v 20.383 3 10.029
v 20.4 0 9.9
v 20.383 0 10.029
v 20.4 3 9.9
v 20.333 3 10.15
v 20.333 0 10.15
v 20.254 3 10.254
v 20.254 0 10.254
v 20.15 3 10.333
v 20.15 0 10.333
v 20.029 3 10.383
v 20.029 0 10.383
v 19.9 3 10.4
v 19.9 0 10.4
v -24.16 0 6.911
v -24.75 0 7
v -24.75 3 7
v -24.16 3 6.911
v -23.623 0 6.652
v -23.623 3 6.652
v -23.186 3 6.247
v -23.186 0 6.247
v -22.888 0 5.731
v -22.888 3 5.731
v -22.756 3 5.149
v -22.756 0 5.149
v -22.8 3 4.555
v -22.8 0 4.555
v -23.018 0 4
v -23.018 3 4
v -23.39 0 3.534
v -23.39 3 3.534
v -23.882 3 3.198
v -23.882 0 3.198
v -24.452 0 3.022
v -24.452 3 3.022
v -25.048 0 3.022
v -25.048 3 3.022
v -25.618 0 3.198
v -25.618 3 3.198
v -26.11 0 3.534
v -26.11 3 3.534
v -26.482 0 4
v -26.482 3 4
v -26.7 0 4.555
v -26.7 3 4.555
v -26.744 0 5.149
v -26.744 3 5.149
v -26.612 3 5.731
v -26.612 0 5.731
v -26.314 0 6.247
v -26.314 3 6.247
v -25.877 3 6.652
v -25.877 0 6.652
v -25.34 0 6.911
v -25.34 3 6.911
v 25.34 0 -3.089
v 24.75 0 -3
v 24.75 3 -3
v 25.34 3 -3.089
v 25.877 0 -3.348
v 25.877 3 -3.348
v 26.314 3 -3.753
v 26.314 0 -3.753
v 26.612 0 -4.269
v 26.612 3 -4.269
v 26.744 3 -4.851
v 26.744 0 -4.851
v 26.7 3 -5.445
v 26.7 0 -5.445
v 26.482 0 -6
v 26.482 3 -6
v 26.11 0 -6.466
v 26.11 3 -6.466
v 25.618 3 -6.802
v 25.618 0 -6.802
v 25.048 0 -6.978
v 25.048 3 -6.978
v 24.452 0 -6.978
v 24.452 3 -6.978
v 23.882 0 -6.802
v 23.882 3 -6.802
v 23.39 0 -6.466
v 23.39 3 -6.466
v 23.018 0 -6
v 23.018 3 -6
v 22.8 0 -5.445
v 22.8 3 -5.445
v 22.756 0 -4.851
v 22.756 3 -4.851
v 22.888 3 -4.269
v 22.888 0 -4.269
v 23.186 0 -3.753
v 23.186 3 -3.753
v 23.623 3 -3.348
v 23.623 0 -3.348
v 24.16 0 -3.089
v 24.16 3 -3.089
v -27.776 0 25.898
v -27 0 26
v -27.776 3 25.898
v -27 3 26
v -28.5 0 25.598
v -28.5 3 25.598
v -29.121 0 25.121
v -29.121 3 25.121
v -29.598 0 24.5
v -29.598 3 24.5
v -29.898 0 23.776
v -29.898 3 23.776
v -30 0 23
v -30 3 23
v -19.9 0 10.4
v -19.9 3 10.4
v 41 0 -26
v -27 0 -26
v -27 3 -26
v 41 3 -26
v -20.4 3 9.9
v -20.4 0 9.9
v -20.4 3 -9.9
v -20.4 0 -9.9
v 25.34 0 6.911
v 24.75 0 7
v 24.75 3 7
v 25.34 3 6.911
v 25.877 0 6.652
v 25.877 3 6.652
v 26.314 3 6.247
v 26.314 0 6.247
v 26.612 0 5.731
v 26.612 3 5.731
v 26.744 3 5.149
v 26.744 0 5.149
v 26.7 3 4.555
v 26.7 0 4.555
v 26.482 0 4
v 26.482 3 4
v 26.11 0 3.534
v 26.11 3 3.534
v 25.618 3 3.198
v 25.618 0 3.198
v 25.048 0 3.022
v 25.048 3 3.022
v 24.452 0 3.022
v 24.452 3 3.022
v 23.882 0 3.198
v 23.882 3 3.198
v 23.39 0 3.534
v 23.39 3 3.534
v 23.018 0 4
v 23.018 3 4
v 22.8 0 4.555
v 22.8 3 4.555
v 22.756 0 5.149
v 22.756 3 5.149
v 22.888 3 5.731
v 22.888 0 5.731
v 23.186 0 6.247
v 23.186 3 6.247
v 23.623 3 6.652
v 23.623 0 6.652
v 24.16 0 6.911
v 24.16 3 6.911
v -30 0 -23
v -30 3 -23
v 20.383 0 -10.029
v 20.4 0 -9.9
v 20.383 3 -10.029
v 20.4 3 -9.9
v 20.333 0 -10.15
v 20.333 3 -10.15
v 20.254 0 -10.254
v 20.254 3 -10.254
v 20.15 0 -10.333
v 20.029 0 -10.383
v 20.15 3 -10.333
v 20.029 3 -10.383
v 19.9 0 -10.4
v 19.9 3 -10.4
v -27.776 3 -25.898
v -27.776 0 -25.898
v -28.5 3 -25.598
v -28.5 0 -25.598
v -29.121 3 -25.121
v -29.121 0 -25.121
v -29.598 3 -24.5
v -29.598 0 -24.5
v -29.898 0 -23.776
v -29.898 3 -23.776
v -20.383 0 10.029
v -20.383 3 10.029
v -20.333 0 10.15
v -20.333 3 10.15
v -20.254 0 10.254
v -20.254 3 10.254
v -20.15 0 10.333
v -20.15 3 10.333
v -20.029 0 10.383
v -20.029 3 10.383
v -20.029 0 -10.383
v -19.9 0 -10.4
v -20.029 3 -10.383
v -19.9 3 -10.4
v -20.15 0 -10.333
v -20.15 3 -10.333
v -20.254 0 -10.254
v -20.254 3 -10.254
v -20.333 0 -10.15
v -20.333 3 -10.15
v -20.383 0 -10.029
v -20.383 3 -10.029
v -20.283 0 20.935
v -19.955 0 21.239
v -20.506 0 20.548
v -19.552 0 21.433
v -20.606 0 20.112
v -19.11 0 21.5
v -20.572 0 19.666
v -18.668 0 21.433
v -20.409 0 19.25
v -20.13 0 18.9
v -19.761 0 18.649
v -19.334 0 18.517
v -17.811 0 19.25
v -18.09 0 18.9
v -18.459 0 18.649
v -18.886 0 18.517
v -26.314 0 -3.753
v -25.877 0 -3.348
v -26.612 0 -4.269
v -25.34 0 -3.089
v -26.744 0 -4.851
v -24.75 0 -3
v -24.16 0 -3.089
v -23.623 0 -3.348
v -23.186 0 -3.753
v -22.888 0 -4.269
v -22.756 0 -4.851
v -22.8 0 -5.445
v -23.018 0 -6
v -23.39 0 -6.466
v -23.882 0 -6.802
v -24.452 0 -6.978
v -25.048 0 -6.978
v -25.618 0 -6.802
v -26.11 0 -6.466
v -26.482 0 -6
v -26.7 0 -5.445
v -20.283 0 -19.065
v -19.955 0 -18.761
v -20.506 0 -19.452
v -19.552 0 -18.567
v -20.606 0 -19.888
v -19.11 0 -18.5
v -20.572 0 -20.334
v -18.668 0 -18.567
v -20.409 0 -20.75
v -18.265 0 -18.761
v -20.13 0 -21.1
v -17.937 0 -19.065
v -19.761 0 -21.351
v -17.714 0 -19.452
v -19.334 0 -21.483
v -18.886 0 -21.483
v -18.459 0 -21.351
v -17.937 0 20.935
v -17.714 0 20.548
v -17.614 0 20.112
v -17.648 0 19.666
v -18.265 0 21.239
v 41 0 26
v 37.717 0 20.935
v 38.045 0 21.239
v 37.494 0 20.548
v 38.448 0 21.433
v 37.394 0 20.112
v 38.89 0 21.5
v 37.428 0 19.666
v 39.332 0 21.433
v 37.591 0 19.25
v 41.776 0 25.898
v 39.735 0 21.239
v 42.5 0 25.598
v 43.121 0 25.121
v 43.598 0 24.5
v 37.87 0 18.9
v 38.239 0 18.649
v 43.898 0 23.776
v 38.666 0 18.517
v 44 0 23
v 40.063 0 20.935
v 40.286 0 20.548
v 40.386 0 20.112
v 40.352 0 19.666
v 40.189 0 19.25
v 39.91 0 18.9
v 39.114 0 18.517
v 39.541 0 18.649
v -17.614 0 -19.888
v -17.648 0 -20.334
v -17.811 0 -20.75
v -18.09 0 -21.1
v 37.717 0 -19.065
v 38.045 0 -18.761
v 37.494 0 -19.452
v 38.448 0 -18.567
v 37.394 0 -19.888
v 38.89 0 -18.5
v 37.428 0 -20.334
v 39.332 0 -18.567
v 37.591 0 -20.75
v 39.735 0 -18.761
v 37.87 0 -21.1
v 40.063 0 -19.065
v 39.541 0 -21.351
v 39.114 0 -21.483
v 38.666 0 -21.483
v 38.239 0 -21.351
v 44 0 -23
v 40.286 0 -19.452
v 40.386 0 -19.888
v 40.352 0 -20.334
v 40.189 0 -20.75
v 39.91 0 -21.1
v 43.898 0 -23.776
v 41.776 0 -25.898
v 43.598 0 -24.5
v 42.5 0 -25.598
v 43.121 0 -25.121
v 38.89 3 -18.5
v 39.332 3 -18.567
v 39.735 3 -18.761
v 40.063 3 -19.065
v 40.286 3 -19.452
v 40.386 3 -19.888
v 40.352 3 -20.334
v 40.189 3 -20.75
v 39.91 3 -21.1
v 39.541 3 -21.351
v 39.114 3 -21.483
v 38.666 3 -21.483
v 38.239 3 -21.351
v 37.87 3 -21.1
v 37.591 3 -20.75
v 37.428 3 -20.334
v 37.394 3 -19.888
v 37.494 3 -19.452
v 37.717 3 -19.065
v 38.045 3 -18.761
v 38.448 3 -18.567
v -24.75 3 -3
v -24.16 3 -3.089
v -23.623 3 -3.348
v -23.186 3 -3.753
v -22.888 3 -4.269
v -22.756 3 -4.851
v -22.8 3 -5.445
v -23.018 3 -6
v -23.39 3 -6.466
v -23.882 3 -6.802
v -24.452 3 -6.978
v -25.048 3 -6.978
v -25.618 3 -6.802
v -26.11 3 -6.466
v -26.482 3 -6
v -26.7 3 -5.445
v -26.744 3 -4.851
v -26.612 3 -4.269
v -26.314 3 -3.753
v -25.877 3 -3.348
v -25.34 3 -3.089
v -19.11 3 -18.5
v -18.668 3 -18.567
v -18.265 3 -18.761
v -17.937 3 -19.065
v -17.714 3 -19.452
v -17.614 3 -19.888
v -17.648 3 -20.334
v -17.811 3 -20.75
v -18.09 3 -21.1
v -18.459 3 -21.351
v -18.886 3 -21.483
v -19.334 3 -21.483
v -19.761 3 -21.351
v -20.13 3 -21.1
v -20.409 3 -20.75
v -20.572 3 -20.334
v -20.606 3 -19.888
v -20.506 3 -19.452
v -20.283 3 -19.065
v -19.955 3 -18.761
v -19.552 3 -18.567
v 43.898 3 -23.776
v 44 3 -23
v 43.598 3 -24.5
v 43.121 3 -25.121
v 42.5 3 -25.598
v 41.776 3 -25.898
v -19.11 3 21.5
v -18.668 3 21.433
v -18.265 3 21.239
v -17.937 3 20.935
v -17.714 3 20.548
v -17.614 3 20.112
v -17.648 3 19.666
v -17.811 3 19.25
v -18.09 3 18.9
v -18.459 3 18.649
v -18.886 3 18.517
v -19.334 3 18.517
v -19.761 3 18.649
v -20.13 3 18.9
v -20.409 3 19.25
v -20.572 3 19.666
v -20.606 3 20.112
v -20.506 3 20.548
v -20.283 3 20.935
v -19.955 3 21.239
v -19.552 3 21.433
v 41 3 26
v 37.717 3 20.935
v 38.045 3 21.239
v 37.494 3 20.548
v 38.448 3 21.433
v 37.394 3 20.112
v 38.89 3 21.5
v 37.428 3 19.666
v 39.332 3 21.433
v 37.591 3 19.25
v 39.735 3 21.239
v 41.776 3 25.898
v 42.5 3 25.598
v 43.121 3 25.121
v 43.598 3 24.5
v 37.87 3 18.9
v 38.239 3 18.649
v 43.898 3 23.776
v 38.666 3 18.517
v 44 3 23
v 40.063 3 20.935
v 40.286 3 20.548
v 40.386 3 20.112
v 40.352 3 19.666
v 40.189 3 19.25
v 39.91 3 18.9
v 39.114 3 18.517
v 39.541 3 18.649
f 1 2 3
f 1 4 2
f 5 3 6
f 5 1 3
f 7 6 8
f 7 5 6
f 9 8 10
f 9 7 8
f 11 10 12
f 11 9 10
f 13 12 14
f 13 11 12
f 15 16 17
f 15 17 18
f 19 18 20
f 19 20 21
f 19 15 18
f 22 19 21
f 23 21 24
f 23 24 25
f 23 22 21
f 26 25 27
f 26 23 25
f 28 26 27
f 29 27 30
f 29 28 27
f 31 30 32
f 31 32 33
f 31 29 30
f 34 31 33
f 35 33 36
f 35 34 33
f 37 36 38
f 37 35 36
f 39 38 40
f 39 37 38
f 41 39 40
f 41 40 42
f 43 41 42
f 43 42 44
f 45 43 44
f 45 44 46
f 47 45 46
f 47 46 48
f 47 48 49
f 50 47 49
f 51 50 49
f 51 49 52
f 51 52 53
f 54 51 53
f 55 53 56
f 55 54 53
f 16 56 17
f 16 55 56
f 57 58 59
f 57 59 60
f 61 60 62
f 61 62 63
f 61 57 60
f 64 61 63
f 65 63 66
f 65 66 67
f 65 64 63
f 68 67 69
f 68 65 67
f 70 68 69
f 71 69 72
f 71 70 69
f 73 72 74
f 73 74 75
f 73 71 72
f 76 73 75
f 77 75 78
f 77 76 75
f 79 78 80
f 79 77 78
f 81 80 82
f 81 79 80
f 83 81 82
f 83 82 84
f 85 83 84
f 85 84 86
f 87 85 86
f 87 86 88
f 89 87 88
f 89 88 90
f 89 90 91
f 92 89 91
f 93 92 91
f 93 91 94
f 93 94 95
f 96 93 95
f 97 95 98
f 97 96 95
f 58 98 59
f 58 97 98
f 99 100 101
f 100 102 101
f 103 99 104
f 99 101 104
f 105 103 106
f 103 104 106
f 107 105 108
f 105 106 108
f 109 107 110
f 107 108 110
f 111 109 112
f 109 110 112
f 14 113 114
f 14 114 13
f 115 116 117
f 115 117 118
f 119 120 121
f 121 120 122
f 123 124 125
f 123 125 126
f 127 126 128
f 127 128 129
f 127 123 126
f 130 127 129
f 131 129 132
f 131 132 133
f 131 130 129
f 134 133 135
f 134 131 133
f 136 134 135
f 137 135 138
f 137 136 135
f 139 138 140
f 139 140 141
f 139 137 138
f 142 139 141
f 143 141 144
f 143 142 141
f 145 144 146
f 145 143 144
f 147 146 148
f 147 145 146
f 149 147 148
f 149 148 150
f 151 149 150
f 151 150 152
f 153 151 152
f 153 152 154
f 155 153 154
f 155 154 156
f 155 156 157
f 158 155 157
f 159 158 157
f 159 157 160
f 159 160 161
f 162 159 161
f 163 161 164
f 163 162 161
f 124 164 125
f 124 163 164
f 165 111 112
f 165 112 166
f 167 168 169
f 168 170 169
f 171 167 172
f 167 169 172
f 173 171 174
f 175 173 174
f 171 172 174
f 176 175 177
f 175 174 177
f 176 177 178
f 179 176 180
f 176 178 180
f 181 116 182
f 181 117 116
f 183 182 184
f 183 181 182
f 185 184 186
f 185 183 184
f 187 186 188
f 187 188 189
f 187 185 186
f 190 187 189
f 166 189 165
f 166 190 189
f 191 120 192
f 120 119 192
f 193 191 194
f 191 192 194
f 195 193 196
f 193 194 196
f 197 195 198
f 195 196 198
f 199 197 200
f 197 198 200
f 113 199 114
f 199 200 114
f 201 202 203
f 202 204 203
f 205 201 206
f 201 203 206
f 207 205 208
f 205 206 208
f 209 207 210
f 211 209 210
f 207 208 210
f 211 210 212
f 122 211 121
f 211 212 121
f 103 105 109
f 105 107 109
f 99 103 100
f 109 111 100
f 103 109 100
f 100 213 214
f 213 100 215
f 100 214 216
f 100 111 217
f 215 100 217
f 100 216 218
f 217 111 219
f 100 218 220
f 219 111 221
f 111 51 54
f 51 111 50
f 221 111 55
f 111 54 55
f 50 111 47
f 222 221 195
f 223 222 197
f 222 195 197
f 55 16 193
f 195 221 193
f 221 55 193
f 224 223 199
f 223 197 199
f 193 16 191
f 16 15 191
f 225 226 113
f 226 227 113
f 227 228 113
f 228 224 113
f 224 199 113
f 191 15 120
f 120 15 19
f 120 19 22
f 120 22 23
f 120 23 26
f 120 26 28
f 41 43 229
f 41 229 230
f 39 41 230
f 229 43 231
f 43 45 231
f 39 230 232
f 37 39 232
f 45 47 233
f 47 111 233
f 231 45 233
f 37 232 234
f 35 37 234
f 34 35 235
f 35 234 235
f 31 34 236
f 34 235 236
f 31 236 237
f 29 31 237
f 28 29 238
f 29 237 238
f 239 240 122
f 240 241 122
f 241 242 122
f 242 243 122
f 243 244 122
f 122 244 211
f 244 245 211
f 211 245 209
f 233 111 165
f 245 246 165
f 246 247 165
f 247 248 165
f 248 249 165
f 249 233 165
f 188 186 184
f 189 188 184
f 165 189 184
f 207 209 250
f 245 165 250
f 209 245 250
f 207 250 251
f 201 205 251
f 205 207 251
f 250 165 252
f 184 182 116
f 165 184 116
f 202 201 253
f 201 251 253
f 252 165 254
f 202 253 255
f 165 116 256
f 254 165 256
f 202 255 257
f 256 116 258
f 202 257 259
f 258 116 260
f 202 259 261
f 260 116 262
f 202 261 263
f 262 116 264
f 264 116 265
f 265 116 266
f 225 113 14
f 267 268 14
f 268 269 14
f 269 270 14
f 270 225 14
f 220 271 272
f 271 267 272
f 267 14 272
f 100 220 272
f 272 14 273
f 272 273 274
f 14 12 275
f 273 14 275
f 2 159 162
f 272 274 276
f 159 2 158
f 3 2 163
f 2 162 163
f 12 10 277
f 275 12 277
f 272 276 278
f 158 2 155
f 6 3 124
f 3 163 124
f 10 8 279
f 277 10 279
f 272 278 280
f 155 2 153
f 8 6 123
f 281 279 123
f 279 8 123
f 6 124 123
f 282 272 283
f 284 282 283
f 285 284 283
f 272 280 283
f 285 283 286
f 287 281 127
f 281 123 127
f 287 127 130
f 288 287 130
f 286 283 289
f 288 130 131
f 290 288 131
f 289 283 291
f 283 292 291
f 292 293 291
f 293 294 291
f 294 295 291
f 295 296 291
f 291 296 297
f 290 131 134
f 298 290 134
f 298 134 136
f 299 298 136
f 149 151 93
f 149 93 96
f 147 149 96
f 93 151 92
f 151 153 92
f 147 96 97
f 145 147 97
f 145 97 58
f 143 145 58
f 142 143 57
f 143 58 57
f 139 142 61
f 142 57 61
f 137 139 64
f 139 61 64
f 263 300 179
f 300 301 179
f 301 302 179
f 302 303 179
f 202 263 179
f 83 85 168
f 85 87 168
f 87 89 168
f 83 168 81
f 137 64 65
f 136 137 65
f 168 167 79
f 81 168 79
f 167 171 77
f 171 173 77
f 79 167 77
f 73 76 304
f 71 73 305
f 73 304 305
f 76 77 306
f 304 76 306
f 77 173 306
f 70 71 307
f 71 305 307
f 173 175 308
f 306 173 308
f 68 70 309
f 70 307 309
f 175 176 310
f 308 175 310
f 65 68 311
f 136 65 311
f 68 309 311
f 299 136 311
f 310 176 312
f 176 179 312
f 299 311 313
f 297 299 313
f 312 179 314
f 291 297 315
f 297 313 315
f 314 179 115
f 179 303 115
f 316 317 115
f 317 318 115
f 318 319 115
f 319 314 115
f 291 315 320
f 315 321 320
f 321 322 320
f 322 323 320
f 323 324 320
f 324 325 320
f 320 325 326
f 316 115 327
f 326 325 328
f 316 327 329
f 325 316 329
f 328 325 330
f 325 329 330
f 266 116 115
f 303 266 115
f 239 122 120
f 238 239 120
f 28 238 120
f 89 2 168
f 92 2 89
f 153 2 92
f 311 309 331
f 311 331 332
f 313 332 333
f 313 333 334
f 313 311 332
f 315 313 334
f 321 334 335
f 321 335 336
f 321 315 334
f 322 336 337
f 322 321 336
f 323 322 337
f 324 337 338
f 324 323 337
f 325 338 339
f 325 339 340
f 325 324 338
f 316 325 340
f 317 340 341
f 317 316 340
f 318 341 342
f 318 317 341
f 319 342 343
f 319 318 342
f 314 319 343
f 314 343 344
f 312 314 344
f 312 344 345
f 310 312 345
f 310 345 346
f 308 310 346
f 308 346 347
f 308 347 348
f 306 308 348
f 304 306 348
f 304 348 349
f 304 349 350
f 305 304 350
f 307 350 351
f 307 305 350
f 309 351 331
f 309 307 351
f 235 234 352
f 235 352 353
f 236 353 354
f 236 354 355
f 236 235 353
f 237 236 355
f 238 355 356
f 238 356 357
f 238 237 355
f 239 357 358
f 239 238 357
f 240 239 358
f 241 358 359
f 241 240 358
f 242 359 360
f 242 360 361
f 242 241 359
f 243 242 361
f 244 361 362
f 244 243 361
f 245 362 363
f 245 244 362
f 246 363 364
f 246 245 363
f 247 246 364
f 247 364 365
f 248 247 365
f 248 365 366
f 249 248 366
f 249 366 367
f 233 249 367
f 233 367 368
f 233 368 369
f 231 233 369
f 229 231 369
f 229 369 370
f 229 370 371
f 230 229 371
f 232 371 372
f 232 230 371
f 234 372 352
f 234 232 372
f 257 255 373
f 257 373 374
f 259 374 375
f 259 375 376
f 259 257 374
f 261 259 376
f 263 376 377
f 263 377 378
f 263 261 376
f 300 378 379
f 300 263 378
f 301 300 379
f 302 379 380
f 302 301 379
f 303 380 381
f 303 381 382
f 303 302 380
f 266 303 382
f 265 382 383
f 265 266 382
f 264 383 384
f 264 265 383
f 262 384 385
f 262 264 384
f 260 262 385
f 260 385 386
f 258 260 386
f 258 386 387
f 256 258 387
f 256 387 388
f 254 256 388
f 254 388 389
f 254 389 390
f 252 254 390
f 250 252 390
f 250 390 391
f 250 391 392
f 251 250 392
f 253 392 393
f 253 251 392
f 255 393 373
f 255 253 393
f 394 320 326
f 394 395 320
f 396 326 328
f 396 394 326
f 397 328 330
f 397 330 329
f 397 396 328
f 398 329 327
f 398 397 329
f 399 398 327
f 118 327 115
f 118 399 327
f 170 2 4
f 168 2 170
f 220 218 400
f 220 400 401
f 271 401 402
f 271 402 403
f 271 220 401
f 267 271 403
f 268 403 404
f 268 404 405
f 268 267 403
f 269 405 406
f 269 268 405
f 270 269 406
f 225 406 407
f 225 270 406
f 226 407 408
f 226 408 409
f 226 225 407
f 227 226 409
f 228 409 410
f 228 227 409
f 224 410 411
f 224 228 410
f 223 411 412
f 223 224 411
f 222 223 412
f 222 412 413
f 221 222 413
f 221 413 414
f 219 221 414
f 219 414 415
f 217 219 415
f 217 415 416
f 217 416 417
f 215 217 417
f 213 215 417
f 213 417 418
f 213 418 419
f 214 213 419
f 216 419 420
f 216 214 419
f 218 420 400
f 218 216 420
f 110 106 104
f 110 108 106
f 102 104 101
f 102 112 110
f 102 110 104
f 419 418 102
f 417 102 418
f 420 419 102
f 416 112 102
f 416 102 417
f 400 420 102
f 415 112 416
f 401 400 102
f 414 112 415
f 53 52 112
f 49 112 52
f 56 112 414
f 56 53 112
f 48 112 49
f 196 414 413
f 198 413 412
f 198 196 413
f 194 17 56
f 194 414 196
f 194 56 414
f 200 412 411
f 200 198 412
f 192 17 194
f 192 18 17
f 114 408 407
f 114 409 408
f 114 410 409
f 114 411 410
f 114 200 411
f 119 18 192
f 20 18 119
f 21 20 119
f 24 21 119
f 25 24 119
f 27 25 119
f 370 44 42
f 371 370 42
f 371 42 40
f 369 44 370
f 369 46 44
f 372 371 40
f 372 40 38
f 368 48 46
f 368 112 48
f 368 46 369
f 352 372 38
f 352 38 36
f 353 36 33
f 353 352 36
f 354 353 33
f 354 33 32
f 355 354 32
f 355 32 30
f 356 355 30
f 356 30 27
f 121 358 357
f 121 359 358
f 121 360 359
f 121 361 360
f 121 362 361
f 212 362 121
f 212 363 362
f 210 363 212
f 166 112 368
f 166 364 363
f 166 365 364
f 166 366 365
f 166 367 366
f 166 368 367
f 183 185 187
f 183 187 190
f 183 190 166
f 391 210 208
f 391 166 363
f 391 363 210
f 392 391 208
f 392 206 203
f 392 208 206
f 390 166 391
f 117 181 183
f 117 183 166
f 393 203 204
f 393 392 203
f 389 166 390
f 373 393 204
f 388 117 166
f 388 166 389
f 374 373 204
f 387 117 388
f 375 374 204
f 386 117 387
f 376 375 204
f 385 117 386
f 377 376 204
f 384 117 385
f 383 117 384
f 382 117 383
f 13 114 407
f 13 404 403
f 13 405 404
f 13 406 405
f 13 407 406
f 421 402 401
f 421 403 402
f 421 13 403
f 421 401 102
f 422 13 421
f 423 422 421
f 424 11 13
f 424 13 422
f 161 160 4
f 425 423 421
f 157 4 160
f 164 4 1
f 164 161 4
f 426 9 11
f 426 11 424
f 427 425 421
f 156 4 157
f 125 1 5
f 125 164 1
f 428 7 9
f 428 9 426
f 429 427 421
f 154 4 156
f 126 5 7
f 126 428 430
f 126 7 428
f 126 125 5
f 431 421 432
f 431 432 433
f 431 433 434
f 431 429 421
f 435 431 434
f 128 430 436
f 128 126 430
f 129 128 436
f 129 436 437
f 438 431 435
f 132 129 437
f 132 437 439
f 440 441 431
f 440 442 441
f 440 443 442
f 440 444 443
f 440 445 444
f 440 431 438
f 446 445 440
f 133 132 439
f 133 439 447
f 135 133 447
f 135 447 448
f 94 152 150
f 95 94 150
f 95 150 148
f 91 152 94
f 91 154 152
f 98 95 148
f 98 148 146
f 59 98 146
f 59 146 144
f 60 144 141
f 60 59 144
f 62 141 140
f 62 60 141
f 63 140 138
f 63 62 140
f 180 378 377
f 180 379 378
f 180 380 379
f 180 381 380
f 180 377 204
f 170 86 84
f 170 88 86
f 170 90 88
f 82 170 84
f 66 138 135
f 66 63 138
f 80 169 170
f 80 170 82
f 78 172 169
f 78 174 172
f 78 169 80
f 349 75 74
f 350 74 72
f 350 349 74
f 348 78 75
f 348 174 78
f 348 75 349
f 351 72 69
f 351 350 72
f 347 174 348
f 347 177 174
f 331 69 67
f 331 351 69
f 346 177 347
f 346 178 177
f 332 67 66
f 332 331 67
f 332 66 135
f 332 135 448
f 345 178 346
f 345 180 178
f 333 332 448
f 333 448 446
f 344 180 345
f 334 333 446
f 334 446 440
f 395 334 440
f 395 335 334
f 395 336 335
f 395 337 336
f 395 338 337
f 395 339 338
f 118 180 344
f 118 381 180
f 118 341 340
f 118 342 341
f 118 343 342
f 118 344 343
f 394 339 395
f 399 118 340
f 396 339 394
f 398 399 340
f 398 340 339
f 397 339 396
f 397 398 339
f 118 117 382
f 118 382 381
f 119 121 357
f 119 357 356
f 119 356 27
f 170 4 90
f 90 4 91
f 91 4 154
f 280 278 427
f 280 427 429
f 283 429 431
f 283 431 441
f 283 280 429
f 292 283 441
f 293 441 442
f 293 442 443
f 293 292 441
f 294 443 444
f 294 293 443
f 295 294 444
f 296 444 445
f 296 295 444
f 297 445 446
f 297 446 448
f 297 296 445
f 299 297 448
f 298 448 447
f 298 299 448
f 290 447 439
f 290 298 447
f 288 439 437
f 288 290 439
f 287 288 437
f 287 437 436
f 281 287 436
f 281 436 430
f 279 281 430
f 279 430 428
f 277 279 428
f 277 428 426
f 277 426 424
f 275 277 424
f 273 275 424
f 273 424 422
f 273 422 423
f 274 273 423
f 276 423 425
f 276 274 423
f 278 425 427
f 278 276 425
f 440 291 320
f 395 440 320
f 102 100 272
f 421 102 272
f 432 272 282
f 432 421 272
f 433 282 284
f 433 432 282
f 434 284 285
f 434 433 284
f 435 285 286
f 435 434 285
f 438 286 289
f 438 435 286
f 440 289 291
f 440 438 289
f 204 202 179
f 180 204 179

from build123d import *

# Parameters (mm, degrees)
SKETCH_1_W      = 60
SKETCH_1_H      = 52
SKETCH_1_R      = 2
SKETCH_1_R_2    = 1.5
SKETCH_1_W_2    = 40.8
SKETCH_1_H_2    = 20.8
SKETCH_1_W_3    = 14
EXTRUDE_1_DEPTH = 3
FILLET_1_R      = 0.5
FILLET_2_R      = 3


with BuildPart() as part:
    # 草图1 → 凸台-拉伸1 (new body)
    # profile 1 of 2: a face of its own
    with BuildSketch(Plane(origin=(0, 0, 0), x_dir=(1, 0, 0), z_dir=(0, 1, 0))):
        Rectangle(SKETCH_1_W, SKETCH_1_H)
        with Locations(Location((-24.75, 5, 0), (0, 0, 270))):
            Circle(SKETCH_1_R, mode=Mode.SUBTRACT)
        with Locations(Location((-24.75, -5, 0), (0, 0, 270))):
            Circle(SKETCH_1_R, mode=Mode.SUBTRACT)
        with Locations(Location((24.75, 5, 0), (0, 0, 270))):
            Circle(SKETCH_1_R, mode=Mode.SUBTRACT)
        with Locations(Location((24.75, -5, 0), (0, 0, 270))):
            Circle(SKETCH_1_R, mode=Mode.SUBTRACT)
        with Locations(Location((-19.11, 20, 0), (0, 0, 270))):
            Circle(SKETCH_1_R_2, mode=Mode.SUBTRACT)
        with Locations(Location((-19.11, -20, 0), (0, 0, 270))):
            Circle(SKETCH_1_R_2, mode=Mode.SUBTRACT)
        Rectangle(SKETCH_1_W_2, SKETCH_1_H_2, mode=Mode.SUBTRACT)
    # profile 2 of 2: a face of its own
    with BuildSketch(Plane(origin=(0, 0, 0), x_dir=(1, 0, 0), z_dir=(0, 1, 0))):
        with Locations((37, 0)):
            Rectangle(SKETCH_1_W_3, SKETCH_1_H)
        with Locations(Location((38.89, -20, 0), (0, 0, 270))):
            Circle(SKETCH_1_R_2, mode=Mode.SUBTRACT)
        with Locations(Location((38.89, 20, 0), (0, 0, 270))):
            Circle(SKETCH_1_R_2, mode=Mode.SUBTRACT)
    extrude(amount=EXTRUDE_1_DEPTH)

    # 圆角1
    fillet_1_edges = [part.edges().sort_by_distance(p)[0] for p in [
        (20.4, 1.5, -10.4),
        (-20.4, 1.5, -10.4),
        (-20.4, 1.5, 10.4),
        (20.4, 1.5, 10.4),
    ]]
    fillet(fillet_1_edges, radius=FILLET_1_R)

    # 圆角2
    fillet_2_edges = [part.edges().sort_by_distance(p)[0] for p in [
        (-30, 1.5, 26),
        (-30, 1.5, -26),
        (44, 1.5, -26),
        (44, 1.5, 26),
    ]]
    fillet(fillet_2_edges, radius=FILLET_2_R)


solid = part.part
